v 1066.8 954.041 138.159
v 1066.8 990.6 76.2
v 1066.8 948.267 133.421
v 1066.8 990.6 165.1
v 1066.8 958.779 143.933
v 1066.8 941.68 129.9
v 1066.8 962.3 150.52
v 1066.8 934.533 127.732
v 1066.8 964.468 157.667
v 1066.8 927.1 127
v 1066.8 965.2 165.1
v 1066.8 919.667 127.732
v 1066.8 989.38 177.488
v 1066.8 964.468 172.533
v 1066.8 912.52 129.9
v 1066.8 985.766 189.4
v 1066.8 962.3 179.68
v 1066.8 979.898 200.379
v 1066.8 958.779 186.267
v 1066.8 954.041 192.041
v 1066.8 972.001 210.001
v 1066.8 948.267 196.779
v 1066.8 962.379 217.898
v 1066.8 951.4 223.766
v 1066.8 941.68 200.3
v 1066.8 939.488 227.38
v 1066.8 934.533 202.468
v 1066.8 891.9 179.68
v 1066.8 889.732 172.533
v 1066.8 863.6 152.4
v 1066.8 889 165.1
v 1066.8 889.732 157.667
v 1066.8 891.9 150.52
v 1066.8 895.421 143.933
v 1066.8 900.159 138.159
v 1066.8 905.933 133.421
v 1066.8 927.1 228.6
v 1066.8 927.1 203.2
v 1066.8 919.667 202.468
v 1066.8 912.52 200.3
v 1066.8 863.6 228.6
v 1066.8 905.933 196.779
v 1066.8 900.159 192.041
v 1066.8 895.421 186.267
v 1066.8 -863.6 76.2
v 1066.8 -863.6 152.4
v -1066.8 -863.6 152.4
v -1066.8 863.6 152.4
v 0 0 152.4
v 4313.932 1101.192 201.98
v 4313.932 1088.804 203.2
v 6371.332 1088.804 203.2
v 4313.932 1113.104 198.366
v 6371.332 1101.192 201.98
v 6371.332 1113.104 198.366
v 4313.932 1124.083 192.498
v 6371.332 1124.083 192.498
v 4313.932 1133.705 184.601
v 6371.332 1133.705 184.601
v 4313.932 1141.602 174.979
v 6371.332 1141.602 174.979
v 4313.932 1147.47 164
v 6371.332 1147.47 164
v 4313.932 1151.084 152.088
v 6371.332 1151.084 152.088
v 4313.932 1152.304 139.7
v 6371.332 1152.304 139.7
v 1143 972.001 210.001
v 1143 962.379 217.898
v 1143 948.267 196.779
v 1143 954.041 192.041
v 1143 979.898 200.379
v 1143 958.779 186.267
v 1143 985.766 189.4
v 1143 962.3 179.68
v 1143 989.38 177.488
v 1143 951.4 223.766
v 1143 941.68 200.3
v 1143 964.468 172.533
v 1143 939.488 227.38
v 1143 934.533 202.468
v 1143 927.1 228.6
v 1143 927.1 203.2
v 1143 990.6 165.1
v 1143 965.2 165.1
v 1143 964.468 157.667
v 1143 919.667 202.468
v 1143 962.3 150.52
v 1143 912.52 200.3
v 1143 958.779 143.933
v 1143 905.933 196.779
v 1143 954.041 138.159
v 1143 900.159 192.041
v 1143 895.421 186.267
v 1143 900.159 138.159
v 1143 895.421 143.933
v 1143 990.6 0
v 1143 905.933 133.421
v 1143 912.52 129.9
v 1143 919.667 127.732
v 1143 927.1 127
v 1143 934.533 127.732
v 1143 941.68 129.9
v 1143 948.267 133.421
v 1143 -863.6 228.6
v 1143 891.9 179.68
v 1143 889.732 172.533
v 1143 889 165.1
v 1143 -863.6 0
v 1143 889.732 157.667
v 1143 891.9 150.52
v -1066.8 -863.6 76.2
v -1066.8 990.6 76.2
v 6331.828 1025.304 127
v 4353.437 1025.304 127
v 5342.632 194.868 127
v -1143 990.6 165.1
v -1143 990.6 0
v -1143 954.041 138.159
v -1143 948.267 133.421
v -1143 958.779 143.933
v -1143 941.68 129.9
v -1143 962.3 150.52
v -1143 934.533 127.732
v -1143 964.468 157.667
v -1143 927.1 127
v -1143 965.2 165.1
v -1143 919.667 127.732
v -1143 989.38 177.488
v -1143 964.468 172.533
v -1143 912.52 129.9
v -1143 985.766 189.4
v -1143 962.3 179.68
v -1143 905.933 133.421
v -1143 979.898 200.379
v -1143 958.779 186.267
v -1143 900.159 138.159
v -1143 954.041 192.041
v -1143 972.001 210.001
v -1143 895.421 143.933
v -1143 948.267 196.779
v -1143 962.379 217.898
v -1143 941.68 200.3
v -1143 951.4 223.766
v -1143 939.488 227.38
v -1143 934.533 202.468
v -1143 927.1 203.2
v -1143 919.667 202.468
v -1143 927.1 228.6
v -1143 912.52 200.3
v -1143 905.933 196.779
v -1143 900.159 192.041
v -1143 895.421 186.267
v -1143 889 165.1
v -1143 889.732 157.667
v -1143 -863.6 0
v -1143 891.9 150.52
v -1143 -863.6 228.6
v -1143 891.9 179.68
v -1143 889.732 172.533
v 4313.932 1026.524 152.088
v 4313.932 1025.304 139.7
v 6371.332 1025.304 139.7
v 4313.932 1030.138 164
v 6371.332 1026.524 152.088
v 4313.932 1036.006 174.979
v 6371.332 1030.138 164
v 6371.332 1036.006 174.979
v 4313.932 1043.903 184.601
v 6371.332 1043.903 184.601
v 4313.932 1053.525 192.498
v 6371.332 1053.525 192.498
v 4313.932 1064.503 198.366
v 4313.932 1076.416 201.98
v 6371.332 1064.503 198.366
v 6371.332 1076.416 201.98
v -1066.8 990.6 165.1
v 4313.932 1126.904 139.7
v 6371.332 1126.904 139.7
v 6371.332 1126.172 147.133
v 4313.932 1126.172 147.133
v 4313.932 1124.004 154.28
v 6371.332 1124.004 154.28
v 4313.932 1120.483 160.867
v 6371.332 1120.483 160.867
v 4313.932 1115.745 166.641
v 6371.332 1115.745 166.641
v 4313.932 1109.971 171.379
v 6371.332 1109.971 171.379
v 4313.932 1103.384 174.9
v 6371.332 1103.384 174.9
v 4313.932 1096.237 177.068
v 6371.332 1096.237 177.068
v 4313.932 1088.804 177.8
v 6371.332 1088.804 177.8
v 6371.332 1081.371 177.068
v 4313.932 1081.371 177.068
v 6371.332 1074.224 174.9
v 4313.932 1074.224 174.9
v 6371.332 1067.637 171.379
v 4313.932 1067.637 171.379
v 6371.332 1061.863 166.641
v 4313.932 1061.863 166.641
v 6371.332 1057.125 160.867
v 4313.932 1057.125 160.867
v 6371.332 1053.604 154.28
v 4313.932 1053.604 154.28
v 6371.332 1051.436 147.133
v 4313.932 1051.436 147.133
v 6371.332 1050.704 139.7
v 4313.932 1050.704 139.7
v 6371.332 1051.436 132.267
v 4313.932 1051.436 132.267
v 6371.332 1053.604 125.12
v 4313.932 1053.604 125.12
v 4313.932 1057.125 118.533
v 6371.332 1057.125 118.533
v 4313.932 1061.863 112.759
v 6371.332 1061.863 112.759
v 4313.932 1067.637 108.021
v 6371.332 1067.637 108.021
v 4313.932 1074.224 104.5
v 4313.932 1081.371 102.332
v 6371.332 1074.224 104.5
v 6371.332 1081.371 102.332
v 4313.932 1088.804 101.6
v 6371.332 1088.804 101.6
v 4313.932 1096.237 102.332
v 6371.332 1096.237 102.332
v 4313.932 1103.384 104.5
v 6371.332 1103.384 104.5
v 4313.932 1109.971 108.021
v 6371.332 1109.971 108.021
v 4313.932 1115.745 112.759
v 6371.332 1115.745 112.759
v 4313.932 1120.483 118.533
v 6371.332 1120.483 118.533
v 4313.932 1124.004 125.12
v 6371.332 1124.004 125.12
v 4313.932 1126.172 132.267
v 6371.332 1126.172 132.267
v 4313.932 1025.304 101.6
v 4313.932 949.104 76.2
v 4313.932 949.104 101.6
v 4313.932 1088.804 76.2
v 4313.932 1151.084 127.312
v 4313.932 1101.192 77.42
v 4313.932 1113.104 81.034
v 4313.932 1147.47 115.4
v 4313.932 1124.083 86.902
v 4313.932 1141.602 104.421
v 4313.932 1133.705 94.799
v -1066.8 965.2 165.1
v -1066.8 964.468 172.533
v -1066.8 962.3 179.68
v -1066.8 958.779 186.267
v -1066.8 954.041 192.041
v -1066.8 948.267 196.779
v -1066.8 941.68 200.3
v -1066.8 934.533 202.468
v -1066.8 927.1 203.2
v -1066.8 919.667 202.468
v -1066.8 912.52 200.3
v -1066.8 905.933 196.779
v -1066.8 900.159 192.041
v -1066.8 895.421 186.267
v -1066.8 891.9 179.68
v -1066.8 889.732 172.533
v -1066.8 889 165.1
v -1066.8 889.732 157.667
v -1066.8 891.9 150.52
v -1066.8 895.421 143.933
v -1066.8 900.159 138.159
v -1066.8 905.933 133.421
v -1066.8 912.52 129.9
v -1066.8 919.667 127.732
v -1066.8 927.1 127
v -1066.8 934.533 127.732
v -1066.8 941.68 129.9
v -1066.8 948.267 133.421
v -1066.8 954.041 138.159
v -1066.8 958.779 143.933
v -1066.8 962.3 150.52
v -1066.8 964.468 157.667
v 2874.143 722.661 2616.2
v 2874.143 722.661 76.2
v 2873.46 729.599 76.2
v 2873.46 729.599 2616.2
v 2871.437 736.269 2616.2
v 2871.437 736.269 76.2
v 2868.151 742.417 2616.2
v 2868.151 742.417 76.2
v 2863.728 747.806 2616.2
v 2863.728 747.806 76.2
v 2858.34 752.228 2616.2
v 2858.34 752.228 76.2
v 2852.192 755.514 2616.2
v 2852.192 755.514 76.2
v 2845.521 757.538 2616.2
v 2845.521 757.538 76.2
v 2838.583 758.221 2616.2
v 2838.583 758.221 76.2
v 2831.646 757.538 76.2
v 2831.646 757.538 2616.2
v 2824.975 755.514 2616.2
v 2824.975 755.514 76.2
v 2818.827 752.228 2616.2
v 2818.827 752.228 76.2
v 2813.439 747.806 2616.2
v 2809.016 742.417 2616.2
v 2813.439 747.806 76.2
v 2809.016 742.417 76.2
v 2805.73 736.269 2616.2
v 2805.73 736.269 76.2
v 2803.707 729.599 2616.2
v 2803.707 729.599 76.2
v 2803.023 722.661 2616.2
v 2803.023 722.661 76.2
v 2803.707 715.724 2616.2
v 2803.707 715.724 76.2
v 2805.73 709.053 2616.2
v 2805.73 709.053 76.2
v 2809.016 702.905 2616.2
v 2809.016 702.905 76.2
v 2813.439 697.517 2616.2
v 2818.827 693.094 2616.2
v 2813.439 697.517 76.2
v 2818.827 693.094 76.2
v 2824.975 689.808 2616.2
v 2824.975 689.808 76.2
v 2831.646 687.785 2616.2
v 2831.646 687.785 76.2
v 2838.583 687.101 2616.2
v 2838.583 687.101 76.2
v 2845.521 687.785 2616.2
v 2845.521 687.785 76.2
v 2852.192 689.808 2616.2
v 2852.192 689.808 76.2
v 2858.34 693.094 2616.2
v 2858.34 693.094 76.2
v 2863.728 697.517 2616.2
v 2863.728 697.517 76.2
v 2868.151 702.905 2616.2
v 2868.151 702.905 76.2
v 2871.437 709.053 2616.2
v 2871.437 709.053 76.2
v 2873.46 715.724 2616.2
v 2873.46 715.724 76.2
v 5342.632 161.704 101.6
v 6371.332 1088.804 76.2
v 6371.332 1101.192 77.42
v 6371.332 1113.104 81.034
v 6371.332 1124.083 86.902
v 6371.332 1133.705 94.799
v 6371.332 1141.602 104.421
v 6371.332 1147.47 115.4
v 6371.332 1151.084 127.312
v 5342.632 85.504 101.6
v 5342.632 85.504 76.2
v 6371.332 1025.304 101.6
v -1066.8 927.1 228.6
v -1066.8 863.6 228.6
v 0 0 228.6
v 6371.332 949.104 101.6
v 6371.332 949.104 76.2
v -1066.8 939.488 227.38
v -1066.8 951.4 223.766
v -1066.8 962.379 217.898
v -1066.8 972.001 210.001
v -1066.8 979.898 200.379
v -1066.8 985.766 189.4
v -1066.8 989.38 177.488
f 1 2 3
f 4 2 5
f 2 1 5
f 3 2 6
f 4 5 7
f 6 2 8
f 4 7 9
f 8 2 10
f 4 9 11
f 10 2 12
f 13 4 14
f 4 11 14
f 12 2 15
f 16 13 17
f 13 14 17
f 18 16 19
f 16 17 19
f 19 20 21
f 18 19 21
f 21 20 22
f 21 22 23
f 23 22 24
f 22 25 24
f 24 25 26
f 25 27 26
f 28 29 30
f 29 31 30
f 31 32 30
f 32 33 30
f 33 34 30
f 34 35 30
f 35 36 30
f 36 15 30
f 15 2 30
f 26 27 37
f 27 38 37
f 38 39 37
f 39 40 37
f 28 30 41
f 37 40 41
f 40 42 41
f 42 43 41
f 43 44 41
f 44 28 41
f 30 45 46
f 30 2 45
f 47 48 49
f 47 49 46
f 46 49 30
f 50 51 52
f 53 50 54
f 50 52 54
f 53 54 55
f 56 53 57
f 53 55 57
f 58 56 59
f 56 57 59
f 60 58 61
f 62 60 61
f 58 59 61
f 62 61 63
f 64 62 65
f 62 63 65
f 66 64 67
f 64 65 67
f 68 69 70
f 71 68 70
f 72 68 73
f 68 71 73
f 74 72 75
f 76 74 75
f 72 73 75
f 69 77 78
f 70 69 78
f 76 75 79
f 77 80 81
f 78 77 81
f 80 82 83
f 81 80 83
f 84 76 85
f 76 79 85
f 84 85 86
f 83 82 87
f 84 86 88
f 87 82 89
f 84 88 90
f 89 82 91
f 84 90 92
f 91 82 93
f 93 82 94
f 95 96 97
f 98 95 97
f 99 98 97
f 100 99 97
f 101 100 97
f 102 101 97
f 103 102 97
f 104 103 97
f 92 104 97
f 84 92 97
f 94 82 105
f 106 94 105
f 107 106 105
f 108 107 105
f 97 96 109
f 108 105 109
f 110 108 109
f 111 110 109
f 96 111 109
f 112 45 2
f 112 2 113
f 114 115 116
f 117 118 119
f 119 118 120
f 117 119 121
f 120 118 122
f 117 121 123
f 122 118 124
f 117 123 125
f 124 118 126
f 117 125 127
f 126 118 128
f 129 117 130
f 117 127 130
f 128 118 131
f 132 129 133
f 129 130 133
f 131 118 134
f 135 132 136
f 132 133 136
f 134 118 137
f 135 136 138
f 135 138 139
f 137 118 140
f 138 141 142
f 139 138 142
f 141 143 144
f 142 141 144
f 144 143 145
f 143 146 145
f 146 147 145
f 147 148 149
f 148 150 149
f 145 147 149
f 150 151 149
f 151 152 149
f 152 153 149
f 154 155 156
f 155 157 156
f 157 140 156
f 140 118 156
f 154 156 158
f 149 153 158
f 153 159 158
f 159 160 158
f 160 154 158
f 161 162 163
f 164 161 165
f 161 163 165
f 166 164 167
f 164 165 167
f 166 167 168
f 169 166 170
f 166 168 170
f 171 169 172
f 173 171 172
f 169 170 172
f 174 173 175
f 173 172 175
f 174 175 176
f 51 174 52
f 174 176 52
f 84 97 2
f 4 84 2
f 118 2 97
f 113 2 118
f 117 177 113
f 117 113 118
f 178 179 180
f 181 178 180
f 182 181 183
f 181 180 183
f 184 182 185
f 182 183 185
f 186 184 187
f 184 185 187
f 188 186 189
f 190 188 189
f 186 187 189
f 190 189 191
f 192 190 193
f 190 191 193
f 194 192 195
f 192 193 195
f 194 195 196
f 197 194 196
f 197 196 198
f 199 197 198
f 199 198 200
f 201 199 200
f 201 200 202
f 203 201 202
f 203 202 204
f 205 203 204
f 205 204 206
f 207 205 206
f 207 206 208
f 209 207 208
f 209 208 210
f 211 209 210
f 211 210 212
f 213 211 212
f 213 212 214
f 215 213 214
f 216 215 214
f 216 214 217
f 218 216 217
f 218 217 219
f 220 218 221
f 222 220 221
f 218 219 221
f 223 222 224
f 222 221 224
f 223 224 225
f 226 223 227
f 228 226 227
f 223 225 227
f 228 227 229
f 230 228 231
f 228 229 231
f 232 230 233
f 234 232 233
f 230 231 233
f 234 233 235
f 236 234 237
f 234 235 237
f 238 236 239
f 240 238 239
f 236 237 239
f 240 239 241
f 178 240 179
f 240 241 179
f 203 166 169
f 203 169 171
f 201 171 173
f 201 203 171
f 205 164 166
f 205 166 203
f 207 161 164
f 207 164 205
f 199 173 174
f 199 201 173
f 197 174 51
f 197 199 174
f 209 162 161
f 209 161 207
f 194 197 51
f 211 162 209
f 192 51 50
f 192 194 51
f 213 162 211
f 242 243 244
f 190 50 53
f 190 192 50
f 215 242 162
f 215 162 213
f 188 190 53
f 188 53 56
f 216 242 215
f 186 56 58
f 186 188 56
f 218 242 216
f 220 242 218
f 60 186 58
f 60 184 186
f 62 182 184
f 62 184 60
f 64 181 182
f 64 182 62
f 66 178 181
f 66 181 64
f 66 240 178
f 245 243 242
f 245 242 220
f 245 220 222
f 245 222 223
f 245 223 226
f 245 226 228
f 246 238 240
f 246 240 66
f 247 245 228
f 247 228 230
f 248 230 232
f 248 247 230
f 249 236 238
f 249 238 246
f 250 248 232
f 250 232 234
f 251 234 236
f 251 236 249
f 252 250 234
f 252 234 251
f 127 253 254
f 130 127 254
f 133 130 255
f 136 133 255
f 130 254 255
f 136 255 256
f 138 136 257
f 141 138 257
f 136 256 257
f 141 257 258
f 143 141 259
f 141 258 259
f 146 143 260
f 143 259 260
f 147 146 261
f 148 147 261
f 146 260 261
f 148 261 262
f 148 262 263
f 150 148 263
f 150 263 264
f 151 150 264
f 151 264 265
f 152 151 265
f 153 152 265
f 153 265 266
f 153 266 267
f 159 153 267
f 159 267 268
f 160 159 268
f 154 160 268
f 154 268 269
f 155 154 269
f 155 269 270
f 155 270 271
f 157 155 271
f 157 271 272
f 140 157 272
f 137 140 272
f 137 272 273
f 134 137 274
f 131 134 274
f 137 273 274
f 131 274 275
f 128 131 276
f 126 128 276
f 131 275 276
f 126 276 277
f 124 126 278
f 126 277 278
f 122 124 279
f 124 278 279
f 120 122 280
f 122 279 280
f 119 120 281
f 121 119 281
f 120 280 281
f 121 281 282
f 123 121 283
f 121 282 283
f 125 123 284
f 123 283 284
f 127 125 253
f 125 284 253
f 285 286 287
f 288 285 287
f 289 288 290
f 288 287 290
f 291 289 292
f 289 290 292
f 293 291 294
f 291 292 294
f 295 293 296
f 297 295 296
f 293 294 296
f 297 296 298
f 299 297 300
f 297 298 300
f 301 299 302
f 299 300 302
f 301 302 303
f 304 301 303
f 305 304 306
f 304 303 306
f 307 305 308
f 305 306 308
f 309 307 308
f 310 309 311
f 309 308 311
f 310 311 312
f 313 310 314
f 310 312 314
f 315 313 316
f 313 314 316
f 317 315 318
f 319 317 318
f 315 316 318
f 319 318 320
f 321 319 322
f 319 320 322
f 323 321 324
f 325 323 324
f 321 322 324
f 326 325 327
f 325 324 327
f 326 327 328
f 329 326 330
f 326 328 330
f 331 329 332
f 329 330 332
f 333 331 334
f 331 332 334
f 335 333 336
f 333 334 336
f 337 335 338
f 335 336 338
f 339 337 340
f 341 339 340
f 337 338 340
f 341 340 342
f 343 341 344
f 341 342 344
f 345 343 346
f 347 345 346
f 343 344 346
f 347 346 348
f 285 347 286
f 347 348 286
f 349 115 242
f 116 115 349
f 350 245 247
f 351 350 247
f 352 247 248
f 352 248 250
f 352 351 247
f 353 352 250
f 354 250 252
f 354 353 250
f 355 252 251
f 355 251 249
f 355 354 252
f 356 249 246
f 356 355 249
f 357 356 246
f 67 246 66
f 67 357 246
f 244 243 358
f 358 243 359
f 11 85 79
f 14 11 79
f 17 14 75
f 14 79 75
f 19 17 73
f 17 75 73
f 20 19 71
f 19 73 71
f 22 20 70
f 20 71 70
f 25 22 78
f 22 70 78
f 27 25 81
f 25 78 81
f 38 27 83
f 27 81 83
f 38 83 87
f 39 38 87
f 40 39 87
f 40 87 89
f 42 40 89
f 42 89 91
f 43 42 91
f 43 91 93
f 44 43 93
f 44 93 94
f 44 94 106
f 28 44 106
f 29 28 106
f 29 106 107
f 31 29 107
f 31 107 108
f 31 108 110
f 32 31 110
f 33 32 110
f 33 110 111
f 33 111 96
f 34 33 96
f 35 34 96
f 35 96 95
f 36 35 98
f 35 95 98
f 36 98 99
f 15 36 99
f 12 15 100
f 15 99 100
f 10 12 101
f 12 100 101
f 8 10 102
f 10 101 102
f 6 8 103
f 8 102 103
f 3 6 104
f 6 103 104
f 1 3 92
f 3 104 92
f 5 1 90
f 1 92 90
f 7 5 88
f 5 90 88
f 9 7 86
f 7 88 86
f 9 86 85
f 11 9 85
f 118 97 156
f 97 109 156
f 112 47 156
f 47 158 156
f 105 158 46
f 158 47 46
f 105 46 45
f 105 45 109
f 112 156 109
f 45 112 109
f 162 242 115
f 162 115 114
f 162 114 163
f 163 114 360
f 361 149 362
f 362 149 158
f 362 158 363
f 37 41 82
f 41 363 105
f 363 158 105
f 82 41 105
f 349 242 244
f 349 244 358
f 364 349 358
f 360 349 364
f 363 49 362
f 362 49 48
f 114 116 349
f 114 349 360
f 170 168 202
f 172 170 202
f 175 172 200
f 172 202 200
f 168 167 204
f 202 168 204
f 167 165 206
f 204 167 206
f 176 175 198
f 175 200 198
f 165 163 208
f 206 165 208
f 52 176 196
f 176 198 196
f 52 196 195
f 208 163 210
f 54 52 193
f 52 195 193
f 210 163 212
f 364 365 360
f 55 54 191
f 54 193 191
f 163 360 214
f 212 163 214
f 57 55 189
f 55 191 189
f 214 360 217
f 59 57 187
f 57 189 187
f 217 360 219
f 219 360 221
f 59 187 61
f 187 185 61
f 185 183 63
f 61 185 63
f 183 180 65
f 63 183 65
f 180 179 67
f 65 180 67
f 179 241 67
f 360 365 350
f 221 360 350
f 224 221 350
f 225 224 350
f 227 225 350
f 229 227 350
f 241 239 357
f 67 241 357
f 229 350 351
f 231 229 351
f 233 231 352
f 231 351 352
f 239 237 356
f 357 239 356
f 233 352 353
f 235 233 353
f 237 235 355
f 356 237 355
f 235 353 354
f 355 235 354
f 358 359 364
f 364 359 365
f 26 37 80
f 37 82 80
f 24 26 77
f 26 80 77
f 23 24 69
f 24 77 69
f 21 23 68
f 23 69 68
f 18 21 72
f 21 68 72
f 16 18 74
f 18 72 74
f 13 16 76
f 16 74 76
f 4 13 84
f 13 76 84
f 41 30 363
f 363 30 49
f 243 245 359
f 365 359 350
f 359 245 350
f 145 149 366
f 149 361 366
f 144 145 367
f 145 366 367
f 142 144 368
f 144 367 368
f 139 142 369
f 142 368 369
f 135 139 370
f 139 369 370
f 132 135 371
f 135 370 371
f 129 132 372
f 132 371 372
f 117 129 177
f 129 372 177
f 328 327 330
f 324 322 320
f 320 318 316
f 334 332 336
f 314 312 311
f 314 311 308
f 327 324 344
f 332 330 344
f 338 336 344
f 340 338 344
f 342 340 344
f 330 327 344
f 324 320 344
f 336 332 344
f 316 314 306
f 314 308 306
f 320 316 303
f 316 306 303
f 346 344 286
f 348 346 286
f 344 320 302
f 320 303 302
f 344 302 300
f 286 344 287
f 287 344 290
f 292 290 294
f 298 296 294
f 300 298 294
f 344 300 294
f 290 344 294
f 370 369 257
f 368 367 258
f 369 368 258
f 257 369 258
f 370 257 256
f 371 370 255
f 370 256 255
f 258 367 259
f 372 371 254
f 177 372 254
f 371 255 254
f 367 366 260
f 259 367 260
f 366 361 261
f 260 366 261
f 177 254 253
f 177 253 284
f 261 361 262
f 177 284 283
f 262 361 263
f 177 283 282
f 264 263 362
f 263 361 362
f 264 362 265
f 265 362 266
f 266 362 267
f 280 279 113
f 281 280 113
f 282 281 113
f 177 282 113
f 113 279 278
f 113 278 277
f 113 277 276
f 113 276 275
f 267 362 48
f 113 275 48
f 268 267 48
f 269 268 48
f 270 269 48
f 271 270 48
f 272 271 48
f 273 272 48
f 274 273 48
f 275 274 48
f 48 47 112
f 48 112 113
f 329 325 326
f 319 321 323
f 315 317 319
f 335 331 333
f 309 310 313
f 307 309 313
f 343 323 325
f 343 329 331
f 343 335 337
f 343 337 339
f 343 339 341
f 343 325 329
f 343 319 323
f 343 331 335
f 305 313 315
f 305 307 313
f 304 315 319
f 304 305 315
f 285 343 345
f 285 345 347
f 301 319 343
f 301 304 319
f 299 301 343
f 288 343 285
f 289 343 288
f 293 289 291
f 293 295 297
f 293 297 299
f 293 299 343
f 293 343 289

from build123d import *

# Parameters (mm, degrees)
F0_W      = 2286
F0_H      = 1727.2
F1_DEPTH  = 76.2
F2_W      = 76.2
F2_H      = 1727.2
F3_DEPTH  = 76.2
F5_START  = 76.2
F4_W      = 76.2
F4_H      = 1727.2
F5_DEPTH  = 76.2
F6_W      = 2133.6
F6_H      = 76.2
F7_DEPTH  = 127
F9_R      = 38.1
F10_DEPTH = 2291.08
F12_DEPTH = 50.8
F13_DEPTH = 25.4
F11_W     = 2057.4
F11_H     = 127
F14_DEPTH = 127
F15_R     = 38.1
F16_DEPTH = 2276.856
F17_R     = 63.49999
F18_SIZE  = 25.39999
F19_SIZE  = 25.39999
F20_R     = 63.5
F21_R     = 35.56
F22_DEPTH = 2540


# Not quite as in the source:
# - a fillet or chamfer is up to 0.001 mm smaller than in the source, because OpenCascade refuses the exact size


with BuildPart() as f1:
    # F0 (on Top) → F1 (new body)
    with BuildSketch(Plane.XY):
        Rectangle(F0_W, F0_H)
    extrude(amount=F1_DEPTH)

    # F2 (on face) → F3 (join)
    with BuildSketch(Plane.XY.offset(76.2)):
        with Locations((-1104.9, 0)):
            Rectangle(F2_W, F2_H)
        with Locations((1104.9, 0)):
            Rectangle(F2_W, F2_H)
    extrude(amount=F3_DEPTH)

    # F4 (on face) → F5 (join)
    with BuildSketch(Plane.XY.offset(76.2).offset(F5_START)):
        with Locations((-1104.9, 0)):
            Rectangle(F4_W, F4_H)
        with Locations((1104.9, 0)):
            Rectangle(F4_W, F4_H)
        Polygon((-1066.8, 863.6), (-1066.8, -863.6), (1066.8, -863.6), (1066.8, 863.6), (0, 0), align=None)
    extrude(amount=F5_DEPTH)

    # F6 (on face) → F7 (join)
    with BuildSketch(Plane(origin=(0, 863.6, 0), x_dir=(-1, 0, 0), z_dir=(0, 1, 0))):
        Polygon((-1143, 228.6), (-1143, 0), (-1066.8, 0), (-1066.8, 76.2), (-1066.8, 152.4), (-1066.8, 228.6), align=None)
        Polygon((1066.8, 76.2), (1066.8, 0), (1143, 0), (1143, 228.6), (1066.8, 228.6), (1066.8, 152.4), align=None)
        with Locations((0, 38.1)):
            Rectangle(F6_W, F6_H)
    extrude(amount=F7_DEPTH)

    # F9 (on face) → F10 (cut)
    with BuildSketch(Plane.YZ.offset(1143)):
        with Locations((927.1, 165.1)):
            Circle(F9_R)
    extrude(amount=-F10_DEPTH, mode=Mode.SUBTRACT)

    # F20
    f20_edges = [f1.edges().sort_by_distance(p)[0] for p in [
        (-1104.9, 990.6, 228.6),
        (1104.9, 990.6, 228.6),
    ]]
    fillet(f20_edges, radius=F20_R)


with BuildPart() as f12:
    # F11 (on face) → F12 (new body)
    with BuildSketch(Plane.XY.offset(76.2)):
        Polygon((6371.3324619645, 1025.3038924217), (4313.9324619645, 1025.3038924217), (5342.6324619645, 161.7038924217), align=None)
    extrude(amount=F12_DEPTH)

    # F11 (on face) → F13 (join)
    with BuildSketch(Plane.XY.offset(76.2)):
        Polygon((5342.6324619645, 161.7038924217), (4313.9324619645, 1025.3038924217), (4313.9324619645, 949.1038924217), (5251.8648149057, 161.7038924217), align=None)
        Polygon((6371.3324619645, 949.1038924217), (6371.3324619645, 1025.3038924217), (5342.6324619645, 161.7038924217), (5433.4001090233, 161.7038924217), align=None)
        Polygon((5433.4001090233, 161.7038924217), (5342.6324619645, 161.7038924217), (5342.6324619645, 85.5038924217), align=None)
        Polygon((5342.6324619645, 85.5038924217), (5342.6324619645, 161.7038924217), (5251.8648149057, 161.7038924217), align=None)
    extrude(amount=F13_DEPTH)

    # F11 (on face) → F14 (join)
    with BuildSketch(Plane.XY.offset(76.2)):
        with Locations((5342.6324619645, 1088.8038924217)):
            Rectangle(F11_W, F11_H)
    extrude(amount=F14_DEPTH)

    # F15 (on face) → F16 (cut)
    with BuildSketch(Plane.YZ.offset(6371.3324619645)):
        with Locations((1088.8038924217, 139.7)):
            Circle(F15_R)
    extrude(amount=-F16_DEPTH, mode=Mode.SUBTRACT)

    # F17 (radius 63.5 in the source; OpenCascade refuses exactly that, so slightly less here)
    f17_edges = [f12.edges().sort_by_distance(p)[0] for p in [
        (5342.632462, 1152.303892, 203.2),
        (5342.632462, 1025.303892, 203.2),
        (5342.632462, 1152.303892, 76.2),
    ]]
    fillet(f17_edges, radius=F17_R)

    # F18 (size 25.4 in the source; OpenCascade refuses exactly that, so slightly less here)
    f18_edges = [f12.edges().sort_by_distance(p)[0] for p in [
        (4828.282462, 593.503892, 127),
    ]]
    chamfer(f18_edges, length=F18_SIZE)

    # F19 (size 25.4 in the source; OpenCascade refuses exactly that, so slightly less here)
    f19_edges = [f12.edges().sort_by_distance(p)[0] for p in [
        (5866.858497, 601.794885, 127),
    ]]
    chamfer(f19_edges, length=F19_SIZE)


with BuildPart() as f22:
    # F21 (on face) → F22 (new body)
    with BuildSketch(Plane.XY.offset(76.2)):
        with Locations((2838.5834693909, 722.6612567902)):
            Circle(F21_R)
    extrude(amount=F22_DEPTH)


solid = Compound([f1.part, f12.part, f22.part])
